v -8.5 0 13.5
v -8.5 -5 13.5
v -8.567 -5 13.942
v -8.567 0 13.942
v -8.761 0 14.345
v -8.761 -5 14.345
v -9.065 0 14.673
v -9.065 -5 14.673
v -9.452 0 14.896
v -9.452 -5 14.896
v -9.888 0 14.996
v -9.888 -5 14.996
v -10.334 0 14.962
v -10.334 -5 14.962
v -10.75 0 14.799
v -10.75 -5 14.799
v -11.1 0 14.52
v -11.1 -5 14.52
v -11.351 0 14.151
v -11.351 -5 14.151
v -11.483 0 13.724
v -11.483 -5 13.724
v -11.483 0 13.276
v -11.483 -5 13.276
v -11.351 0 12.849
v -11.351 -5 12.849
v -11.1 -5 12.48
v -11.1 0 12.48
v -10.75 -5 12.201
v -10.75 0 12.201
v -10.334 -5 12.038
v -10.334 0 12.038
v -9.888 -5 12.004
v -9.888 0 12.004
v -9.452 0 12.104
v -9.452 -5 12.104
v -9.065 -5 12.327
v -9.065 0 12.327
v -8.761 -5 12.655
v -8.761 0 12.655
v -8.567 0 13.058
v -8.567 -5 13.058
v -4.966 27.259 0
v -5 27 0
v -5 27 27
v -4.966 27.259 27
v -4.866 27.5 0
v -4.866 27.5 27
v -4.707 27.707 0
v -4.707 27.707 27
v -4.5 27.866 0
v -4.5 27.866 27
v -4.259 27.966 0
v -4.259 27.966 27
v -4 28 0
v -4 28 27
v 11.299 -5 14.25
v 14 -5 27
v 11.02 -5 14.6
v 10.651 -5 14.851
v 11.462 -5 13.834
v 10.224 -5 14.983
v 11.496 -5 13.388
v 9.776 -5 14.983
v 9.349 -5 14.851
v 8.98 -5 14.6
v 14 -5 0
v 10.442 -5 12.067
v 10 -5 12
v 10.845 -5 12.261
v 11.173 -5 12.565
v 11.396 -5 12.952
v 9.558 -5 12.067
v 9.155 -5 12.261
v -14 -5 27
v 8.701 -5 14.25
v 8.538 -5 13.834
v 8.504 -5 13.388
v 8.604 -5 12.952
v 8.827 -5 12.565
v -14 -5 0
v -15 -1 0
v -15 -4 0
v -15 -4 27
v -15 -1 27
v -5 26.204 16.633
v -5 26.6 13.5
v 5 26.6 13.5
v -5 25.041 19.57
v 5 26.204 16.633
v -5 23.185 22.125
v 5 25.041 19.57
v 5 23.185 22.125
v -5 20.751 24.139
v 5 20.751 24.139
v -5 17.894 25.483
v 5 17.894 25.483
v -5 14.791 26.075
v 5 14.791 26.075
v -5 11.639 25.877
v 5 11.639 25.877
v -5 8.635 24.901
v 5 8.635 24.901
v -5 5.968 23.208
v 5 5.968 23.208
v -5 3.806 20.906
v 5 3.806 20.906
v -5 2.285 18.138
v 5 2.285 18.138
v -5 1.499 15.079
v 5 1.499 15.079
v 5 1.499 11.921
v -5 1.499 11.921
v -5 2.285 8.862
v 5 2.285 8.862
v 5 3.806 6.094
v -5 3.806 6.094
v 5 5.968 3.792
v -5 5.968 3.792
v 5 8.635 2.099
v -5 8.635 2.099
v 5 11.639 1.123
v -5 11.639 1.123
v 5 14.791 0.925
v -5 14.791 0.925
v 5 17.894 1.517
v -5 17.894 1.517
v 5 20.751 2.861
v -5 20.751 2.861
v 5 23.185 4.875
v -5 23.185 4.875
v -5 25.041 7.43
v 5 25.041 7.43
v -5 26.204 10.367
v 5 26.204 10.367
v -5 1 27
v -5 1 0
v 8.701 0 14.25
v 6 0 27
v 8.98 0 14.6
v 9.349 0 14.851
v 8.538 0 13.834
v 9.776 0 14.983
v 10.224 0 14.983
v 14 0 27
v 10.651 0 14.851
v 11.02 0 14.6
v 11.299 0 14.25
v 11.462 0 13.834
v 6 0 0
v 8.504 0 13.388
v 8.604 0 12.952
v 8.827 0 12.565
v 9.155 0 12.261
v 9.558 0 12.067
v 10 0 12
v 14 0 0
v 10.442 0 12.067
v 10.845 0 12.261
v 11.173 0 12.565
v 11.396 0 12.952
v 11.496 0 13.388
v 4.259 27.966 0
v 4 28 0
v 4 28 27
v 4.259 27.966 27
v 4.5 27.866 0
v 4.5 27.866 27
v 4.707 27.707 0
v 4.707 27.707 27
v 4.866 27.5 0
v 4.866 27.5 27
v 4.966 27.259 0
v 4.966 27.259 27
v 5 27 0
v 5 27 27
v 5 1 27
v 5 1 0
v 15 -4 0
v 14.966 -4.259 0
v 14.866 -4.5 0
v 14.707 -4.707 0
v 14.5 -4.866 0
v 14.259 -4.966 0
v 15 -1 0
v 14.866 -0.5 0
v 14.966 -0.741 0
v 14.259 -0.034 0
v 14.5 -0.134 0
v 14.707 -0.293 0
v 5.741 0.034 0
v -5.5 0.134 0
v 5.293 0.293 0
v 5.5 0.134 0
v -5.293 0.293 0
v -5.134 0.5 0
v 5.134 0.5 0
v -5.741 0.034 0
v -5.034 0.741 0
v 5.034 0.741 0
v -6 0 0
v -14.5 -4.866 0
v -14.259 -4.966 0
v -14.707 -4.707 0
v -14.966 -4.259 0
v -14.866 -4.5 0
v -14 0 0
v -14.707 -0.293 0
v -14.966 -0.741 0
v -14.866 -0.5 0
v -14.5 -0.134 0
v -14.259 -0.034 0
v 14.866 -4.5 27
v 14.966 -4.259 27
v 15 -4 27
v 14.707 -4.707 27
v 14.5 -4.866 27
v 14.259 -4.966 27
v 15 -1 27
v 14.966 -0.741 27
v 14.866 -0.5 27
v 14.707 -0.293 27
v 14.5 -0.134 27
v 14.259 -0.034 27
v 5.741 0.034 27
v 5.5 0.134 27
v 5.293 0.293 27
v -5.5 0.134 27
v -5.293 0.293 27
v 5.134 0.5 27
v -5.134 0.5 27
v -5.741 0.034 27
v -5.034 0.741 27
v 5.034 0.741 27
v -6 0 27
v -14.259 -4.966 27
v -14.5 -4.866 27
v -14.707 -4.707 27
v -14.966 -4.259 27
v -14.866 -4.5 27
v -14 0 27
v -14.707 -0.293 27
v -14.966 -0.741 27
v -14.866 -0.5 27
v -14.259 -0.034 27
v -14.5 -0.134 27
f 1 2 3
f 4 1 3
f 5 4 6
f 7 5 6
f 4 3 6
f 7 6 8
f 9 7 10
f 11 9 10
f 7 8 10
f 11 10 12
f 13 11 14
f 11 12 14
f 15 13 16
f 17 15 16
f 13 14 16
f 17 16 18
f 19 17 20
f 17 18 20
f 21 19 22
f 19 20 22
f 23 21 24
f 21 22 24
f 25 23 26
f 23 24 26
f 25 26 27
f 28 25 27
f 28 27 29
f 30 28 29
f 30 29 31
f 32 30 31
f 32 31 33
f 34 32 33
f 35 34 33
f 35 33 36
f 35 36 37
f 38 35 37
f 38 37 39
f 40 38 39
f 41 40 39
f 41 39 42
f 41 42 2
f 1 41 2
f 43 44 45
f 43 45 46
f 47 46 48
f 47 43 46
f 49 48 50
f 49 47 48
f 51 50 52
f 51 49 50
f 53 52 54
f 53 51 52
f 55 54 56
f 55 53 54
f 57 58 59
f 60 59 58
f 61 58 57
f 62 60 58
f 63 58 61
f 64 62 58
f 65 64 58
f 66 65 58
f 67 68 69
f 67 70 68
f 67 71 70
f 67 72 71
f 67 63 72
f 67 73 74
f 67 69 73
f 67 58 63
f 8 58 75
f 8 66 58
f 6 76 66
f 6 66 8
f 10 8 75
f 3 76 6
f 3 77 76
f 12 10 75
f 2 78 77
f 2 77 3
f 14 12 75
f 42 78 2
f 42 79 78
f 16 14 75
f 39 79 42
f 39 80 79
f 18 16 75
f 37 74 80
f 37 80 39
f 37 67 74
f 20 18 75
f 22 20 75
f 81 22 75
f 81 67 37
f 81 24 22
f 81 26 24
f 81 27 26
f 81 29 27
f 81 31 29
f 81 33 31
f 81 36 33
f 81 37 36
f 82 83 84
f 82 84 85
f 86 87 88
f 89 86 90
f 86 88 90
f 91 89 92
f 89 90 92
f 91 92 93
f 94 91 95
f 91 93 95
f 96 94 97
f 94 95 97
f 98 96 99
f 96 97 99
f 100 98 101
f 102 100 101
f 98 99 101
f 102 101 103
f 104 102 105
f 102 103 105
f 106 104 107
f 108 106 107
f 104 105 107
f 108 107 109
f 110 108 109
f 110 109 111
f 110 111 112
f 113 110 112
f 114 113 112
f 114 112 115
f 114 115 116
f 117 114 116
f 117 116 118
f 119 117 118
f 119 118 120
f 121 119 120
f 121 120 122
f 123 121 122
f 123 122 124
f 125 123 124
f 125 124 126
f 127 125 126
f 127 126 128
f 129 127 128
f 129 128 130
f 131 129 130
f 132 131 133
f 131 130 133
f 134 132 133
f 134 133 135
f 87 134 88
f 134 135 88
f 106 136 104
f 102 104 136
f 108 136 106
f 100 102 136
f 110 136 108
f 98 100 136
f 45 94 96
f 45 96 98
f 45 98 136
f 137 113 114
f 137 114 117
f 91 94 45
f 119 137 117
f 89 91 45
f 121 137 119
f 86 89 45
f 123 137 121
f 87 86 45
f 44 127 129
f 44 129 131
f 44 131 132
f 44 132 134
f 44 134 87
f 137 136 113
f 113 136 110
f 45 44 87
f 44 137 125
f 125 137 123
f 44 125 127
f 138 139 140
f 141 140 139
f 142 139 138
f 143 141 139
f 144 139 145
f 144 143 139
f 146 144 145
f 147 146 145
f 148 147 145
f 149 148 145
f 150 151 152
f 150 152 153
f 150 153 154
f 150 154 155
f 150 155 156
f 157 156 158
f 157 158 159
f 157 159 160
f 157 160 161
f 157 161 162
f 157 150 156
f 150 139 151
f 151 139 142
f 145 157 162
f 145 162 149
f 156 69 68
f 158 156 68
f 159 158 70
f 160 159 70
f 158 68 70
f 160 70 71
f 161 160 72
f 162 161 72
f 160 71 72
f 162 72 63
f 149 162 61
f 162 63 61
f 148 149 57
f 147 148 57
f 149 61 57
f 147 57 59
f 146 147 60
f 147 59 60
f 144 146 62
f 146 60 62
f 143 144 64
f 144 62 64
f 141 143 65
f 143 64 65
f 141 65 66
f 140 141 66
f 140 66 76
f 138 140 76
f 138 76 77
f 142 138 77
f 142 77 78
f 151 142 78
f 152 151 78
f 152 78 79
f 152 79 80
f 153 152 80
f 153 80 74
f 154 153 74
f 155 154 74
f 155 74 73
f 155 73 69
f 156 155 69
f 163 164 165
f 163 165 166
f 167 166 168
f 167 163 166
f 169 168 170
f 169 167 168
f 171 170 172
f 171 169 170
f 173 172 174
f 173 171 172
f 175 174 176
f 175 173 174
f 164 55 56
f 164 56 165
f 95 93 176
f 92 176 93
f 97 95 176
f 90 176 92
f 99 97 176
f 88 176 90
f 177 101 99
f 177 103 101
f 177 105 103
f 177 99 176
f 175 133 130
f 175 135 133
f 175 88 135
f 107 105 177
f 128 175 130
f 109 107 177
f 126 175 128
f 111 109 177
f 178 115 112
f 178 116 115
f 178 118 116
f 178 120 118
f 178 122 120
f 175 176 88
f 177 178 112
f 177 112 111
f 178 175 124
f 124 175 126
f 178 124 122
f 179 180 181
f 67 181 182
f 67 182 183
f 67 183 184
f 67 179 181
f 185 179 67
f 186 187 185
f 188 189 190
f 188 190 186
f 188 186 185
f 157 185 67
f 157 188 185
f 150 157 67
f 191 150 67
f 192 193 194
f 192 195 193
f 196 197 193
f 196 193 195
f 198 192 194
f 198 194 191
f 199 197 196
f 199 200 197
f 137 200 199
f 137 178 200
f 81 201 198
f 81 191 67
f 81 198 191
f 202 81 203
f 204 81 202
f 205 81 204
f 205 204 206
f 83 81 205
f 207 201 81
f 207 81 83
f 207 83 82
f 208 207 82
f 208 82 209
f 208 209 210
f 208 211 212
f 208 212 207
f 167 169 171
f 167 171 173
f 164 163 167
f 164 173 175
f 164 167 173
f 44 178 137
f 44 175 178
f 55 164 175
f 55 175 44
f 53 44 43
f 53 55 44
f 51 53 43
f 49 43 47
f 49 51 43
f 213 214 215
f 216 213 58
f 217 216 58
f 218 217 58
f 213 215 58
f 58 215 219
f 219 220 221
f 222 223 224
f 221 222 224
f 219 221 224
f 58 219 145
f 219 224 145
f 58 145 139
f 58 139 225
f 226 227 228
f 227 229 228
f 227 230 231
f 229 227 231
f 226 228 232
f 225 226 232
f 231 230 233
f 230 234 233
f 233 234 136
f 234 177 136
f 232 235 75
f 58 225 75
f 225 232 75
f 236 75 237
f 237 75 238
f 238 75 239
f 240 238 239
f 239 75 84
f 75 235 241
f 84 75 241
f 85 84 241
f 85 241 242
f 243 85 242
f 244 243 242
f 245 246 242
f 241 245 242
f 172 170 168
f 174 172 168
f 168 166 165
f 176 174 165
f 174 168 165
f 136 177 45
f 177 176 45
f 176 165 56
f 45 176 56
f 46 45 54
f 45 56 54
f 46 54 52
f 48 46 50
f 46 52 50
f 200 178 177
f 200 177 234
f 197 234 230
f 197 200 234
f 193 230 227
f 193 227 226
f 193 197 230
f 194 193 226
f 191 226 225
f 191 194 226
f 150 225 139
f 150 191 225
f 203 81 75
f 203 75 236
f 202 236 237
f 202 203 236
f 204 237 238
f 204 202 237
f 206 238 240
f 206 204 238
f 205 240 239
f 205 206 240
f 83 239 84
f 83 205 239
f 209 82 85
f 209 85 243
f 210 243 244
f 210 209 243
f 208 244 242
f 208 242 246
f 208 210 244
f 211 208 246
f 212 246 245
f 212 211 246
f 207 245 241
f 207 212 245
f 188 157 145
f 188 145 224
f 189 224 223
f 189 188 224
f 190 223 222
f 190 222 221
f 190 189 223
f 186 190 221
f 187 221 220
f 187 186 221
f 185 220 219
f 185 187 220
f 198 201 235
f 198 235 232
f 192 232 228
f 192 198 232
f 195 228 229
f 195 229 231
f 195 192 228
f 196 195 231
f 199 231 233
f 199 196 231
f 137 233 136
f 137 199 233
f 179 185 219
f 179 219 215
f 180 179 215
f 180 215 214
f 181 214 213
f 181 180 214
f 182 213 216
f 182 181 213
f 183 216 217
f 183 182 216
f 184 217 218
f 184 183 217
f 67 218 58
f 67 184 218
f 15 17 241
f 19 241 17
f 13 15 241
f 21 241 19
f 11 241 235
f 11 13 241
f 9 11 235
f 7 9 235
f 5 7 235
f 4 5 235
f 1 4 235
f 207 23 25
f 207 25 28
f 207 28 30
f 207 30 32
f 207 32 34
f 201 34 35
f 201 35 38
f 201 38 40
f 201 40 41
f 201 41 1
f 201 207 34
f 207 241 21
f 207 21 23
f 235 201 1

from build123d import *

# Parameters (mm, degrees)
BOSS_EXTRUDE1_DEPTH = 27
CUT_EXTRUDE1_REACH  = 45.738
SKETCH2_R           = 12.6
CUT_EXTRUDE2_REACH  = 47.2
SKETCH3_R           = 1.5


with BuildPart() as part:
    # Sketch1 → Boss-Extrude1 (new body)
    with BuildSketch(Plane.XY):
        with BuildLine():
            Line((-14, 0), (-6, 0))
            ThreePointArc((-6, 0), (-5.292893219, 0.292893219), (-5, 1))
            Line((-5, 1), (-5, 27))
            ThreePointArc((-5, 27), (-4.707106781, 27.707106781), (-4, 28))
            Line((-4, 28), (4, 28))
            ThreePointArc((4, 28), (4.707106781, 27.707106781), (5, 27))
            Line((5, 27), (5, 1))
            ThreePointArc((5, 1), (5.292893219, 0.292893219), (6, 0))
            Line((6, 0), (14, 0))
            ThreePointArc((14, 0), (14.707106781, -0.292893219), (15, -1))
            Line((15, -1), (15, -4))
            ThreePointArc((15, -4), (14.707106781, -4.707106781), (14, -5))
            Line((14, -5), (-14, -5))
            ThreePointArc((-14, -5), (-14.707106781, -4.707106781), (-15, -4))
            Line((-15, -4), (-15, -1))
            ThreePointArc((-15, -1), (-14.707106781, -0.292893219), (-14, 0))
        make_face()
    extrude(amount=BOSS_EXTRUDE1_DEPTH)

    # Sketch2 → Cut-Extrude1 (cut, up to next)
    with BuildSketch(Plane(origin=(5, 0, 0), x_dir=(0, 0, -1), z_dir=(1, 0, 0)), mode=Mode.PRIVATE) as cut_extrude1_sk1:
        with Locations(Location((-13.5, 14, 0), (0, 0, 90))):
            Circle(SKETCH2_R)
    cut_extrude1_tool1 = extrude(cut_extrude1_sk1.sketch, amount=-CUT_EXTRUDE1_REACH, mode=Mode.PRIVATE) & part.part
    add(cut_extrude1_tool1.solids().sort_by_distance((5, 14, 13.5))[0], mode=Mode.SUBTRACT)

    # Sketch3 → Cut-Extrude2 (cut, up to next)
    with BuildSketch(Plane.XZ.offset(5), mode=Mode.PRIVATE) as cut_extrude2_sk1:
        with Locations((-10, 13.5)):
            Circle(SKETCH3_R)
    cut_extrude2_tool1 = extrude(cut_extrude2_sk1.sketch, amount=-CUT_EXTRUDE2_REACH, mode=Mode.PRIVATE) & part.part
    # Sketch3 → Cut-Extrude2 (cut, up to next)
    with BuildSketch(Plane.XZ.offset(5), mode=Mode.PRIVATE) as cut_extrude2_sk2:
        with Locations(Location((10, 13.5, 0), (0, 0, 270))):
            Circle(SKETCH3_R)
    cut_extrude2_tool2 = extrude(cut_extrude2_sk2.sketch, amount=-CUT_EXTRUDE2_REACH, mode=Mode.PRIVATE) & part.part
    add(cut_extrude2_tool1.solids().sort_by_distance((-10, -5, 13.5))[0], mode=Mode.SUBTRACT)
    add(cut_extrude2_tool2.solids().sort_by_distance((10, -5, 13.5))[0], mode=Mode.SUBTRACT)


solid = part.part
